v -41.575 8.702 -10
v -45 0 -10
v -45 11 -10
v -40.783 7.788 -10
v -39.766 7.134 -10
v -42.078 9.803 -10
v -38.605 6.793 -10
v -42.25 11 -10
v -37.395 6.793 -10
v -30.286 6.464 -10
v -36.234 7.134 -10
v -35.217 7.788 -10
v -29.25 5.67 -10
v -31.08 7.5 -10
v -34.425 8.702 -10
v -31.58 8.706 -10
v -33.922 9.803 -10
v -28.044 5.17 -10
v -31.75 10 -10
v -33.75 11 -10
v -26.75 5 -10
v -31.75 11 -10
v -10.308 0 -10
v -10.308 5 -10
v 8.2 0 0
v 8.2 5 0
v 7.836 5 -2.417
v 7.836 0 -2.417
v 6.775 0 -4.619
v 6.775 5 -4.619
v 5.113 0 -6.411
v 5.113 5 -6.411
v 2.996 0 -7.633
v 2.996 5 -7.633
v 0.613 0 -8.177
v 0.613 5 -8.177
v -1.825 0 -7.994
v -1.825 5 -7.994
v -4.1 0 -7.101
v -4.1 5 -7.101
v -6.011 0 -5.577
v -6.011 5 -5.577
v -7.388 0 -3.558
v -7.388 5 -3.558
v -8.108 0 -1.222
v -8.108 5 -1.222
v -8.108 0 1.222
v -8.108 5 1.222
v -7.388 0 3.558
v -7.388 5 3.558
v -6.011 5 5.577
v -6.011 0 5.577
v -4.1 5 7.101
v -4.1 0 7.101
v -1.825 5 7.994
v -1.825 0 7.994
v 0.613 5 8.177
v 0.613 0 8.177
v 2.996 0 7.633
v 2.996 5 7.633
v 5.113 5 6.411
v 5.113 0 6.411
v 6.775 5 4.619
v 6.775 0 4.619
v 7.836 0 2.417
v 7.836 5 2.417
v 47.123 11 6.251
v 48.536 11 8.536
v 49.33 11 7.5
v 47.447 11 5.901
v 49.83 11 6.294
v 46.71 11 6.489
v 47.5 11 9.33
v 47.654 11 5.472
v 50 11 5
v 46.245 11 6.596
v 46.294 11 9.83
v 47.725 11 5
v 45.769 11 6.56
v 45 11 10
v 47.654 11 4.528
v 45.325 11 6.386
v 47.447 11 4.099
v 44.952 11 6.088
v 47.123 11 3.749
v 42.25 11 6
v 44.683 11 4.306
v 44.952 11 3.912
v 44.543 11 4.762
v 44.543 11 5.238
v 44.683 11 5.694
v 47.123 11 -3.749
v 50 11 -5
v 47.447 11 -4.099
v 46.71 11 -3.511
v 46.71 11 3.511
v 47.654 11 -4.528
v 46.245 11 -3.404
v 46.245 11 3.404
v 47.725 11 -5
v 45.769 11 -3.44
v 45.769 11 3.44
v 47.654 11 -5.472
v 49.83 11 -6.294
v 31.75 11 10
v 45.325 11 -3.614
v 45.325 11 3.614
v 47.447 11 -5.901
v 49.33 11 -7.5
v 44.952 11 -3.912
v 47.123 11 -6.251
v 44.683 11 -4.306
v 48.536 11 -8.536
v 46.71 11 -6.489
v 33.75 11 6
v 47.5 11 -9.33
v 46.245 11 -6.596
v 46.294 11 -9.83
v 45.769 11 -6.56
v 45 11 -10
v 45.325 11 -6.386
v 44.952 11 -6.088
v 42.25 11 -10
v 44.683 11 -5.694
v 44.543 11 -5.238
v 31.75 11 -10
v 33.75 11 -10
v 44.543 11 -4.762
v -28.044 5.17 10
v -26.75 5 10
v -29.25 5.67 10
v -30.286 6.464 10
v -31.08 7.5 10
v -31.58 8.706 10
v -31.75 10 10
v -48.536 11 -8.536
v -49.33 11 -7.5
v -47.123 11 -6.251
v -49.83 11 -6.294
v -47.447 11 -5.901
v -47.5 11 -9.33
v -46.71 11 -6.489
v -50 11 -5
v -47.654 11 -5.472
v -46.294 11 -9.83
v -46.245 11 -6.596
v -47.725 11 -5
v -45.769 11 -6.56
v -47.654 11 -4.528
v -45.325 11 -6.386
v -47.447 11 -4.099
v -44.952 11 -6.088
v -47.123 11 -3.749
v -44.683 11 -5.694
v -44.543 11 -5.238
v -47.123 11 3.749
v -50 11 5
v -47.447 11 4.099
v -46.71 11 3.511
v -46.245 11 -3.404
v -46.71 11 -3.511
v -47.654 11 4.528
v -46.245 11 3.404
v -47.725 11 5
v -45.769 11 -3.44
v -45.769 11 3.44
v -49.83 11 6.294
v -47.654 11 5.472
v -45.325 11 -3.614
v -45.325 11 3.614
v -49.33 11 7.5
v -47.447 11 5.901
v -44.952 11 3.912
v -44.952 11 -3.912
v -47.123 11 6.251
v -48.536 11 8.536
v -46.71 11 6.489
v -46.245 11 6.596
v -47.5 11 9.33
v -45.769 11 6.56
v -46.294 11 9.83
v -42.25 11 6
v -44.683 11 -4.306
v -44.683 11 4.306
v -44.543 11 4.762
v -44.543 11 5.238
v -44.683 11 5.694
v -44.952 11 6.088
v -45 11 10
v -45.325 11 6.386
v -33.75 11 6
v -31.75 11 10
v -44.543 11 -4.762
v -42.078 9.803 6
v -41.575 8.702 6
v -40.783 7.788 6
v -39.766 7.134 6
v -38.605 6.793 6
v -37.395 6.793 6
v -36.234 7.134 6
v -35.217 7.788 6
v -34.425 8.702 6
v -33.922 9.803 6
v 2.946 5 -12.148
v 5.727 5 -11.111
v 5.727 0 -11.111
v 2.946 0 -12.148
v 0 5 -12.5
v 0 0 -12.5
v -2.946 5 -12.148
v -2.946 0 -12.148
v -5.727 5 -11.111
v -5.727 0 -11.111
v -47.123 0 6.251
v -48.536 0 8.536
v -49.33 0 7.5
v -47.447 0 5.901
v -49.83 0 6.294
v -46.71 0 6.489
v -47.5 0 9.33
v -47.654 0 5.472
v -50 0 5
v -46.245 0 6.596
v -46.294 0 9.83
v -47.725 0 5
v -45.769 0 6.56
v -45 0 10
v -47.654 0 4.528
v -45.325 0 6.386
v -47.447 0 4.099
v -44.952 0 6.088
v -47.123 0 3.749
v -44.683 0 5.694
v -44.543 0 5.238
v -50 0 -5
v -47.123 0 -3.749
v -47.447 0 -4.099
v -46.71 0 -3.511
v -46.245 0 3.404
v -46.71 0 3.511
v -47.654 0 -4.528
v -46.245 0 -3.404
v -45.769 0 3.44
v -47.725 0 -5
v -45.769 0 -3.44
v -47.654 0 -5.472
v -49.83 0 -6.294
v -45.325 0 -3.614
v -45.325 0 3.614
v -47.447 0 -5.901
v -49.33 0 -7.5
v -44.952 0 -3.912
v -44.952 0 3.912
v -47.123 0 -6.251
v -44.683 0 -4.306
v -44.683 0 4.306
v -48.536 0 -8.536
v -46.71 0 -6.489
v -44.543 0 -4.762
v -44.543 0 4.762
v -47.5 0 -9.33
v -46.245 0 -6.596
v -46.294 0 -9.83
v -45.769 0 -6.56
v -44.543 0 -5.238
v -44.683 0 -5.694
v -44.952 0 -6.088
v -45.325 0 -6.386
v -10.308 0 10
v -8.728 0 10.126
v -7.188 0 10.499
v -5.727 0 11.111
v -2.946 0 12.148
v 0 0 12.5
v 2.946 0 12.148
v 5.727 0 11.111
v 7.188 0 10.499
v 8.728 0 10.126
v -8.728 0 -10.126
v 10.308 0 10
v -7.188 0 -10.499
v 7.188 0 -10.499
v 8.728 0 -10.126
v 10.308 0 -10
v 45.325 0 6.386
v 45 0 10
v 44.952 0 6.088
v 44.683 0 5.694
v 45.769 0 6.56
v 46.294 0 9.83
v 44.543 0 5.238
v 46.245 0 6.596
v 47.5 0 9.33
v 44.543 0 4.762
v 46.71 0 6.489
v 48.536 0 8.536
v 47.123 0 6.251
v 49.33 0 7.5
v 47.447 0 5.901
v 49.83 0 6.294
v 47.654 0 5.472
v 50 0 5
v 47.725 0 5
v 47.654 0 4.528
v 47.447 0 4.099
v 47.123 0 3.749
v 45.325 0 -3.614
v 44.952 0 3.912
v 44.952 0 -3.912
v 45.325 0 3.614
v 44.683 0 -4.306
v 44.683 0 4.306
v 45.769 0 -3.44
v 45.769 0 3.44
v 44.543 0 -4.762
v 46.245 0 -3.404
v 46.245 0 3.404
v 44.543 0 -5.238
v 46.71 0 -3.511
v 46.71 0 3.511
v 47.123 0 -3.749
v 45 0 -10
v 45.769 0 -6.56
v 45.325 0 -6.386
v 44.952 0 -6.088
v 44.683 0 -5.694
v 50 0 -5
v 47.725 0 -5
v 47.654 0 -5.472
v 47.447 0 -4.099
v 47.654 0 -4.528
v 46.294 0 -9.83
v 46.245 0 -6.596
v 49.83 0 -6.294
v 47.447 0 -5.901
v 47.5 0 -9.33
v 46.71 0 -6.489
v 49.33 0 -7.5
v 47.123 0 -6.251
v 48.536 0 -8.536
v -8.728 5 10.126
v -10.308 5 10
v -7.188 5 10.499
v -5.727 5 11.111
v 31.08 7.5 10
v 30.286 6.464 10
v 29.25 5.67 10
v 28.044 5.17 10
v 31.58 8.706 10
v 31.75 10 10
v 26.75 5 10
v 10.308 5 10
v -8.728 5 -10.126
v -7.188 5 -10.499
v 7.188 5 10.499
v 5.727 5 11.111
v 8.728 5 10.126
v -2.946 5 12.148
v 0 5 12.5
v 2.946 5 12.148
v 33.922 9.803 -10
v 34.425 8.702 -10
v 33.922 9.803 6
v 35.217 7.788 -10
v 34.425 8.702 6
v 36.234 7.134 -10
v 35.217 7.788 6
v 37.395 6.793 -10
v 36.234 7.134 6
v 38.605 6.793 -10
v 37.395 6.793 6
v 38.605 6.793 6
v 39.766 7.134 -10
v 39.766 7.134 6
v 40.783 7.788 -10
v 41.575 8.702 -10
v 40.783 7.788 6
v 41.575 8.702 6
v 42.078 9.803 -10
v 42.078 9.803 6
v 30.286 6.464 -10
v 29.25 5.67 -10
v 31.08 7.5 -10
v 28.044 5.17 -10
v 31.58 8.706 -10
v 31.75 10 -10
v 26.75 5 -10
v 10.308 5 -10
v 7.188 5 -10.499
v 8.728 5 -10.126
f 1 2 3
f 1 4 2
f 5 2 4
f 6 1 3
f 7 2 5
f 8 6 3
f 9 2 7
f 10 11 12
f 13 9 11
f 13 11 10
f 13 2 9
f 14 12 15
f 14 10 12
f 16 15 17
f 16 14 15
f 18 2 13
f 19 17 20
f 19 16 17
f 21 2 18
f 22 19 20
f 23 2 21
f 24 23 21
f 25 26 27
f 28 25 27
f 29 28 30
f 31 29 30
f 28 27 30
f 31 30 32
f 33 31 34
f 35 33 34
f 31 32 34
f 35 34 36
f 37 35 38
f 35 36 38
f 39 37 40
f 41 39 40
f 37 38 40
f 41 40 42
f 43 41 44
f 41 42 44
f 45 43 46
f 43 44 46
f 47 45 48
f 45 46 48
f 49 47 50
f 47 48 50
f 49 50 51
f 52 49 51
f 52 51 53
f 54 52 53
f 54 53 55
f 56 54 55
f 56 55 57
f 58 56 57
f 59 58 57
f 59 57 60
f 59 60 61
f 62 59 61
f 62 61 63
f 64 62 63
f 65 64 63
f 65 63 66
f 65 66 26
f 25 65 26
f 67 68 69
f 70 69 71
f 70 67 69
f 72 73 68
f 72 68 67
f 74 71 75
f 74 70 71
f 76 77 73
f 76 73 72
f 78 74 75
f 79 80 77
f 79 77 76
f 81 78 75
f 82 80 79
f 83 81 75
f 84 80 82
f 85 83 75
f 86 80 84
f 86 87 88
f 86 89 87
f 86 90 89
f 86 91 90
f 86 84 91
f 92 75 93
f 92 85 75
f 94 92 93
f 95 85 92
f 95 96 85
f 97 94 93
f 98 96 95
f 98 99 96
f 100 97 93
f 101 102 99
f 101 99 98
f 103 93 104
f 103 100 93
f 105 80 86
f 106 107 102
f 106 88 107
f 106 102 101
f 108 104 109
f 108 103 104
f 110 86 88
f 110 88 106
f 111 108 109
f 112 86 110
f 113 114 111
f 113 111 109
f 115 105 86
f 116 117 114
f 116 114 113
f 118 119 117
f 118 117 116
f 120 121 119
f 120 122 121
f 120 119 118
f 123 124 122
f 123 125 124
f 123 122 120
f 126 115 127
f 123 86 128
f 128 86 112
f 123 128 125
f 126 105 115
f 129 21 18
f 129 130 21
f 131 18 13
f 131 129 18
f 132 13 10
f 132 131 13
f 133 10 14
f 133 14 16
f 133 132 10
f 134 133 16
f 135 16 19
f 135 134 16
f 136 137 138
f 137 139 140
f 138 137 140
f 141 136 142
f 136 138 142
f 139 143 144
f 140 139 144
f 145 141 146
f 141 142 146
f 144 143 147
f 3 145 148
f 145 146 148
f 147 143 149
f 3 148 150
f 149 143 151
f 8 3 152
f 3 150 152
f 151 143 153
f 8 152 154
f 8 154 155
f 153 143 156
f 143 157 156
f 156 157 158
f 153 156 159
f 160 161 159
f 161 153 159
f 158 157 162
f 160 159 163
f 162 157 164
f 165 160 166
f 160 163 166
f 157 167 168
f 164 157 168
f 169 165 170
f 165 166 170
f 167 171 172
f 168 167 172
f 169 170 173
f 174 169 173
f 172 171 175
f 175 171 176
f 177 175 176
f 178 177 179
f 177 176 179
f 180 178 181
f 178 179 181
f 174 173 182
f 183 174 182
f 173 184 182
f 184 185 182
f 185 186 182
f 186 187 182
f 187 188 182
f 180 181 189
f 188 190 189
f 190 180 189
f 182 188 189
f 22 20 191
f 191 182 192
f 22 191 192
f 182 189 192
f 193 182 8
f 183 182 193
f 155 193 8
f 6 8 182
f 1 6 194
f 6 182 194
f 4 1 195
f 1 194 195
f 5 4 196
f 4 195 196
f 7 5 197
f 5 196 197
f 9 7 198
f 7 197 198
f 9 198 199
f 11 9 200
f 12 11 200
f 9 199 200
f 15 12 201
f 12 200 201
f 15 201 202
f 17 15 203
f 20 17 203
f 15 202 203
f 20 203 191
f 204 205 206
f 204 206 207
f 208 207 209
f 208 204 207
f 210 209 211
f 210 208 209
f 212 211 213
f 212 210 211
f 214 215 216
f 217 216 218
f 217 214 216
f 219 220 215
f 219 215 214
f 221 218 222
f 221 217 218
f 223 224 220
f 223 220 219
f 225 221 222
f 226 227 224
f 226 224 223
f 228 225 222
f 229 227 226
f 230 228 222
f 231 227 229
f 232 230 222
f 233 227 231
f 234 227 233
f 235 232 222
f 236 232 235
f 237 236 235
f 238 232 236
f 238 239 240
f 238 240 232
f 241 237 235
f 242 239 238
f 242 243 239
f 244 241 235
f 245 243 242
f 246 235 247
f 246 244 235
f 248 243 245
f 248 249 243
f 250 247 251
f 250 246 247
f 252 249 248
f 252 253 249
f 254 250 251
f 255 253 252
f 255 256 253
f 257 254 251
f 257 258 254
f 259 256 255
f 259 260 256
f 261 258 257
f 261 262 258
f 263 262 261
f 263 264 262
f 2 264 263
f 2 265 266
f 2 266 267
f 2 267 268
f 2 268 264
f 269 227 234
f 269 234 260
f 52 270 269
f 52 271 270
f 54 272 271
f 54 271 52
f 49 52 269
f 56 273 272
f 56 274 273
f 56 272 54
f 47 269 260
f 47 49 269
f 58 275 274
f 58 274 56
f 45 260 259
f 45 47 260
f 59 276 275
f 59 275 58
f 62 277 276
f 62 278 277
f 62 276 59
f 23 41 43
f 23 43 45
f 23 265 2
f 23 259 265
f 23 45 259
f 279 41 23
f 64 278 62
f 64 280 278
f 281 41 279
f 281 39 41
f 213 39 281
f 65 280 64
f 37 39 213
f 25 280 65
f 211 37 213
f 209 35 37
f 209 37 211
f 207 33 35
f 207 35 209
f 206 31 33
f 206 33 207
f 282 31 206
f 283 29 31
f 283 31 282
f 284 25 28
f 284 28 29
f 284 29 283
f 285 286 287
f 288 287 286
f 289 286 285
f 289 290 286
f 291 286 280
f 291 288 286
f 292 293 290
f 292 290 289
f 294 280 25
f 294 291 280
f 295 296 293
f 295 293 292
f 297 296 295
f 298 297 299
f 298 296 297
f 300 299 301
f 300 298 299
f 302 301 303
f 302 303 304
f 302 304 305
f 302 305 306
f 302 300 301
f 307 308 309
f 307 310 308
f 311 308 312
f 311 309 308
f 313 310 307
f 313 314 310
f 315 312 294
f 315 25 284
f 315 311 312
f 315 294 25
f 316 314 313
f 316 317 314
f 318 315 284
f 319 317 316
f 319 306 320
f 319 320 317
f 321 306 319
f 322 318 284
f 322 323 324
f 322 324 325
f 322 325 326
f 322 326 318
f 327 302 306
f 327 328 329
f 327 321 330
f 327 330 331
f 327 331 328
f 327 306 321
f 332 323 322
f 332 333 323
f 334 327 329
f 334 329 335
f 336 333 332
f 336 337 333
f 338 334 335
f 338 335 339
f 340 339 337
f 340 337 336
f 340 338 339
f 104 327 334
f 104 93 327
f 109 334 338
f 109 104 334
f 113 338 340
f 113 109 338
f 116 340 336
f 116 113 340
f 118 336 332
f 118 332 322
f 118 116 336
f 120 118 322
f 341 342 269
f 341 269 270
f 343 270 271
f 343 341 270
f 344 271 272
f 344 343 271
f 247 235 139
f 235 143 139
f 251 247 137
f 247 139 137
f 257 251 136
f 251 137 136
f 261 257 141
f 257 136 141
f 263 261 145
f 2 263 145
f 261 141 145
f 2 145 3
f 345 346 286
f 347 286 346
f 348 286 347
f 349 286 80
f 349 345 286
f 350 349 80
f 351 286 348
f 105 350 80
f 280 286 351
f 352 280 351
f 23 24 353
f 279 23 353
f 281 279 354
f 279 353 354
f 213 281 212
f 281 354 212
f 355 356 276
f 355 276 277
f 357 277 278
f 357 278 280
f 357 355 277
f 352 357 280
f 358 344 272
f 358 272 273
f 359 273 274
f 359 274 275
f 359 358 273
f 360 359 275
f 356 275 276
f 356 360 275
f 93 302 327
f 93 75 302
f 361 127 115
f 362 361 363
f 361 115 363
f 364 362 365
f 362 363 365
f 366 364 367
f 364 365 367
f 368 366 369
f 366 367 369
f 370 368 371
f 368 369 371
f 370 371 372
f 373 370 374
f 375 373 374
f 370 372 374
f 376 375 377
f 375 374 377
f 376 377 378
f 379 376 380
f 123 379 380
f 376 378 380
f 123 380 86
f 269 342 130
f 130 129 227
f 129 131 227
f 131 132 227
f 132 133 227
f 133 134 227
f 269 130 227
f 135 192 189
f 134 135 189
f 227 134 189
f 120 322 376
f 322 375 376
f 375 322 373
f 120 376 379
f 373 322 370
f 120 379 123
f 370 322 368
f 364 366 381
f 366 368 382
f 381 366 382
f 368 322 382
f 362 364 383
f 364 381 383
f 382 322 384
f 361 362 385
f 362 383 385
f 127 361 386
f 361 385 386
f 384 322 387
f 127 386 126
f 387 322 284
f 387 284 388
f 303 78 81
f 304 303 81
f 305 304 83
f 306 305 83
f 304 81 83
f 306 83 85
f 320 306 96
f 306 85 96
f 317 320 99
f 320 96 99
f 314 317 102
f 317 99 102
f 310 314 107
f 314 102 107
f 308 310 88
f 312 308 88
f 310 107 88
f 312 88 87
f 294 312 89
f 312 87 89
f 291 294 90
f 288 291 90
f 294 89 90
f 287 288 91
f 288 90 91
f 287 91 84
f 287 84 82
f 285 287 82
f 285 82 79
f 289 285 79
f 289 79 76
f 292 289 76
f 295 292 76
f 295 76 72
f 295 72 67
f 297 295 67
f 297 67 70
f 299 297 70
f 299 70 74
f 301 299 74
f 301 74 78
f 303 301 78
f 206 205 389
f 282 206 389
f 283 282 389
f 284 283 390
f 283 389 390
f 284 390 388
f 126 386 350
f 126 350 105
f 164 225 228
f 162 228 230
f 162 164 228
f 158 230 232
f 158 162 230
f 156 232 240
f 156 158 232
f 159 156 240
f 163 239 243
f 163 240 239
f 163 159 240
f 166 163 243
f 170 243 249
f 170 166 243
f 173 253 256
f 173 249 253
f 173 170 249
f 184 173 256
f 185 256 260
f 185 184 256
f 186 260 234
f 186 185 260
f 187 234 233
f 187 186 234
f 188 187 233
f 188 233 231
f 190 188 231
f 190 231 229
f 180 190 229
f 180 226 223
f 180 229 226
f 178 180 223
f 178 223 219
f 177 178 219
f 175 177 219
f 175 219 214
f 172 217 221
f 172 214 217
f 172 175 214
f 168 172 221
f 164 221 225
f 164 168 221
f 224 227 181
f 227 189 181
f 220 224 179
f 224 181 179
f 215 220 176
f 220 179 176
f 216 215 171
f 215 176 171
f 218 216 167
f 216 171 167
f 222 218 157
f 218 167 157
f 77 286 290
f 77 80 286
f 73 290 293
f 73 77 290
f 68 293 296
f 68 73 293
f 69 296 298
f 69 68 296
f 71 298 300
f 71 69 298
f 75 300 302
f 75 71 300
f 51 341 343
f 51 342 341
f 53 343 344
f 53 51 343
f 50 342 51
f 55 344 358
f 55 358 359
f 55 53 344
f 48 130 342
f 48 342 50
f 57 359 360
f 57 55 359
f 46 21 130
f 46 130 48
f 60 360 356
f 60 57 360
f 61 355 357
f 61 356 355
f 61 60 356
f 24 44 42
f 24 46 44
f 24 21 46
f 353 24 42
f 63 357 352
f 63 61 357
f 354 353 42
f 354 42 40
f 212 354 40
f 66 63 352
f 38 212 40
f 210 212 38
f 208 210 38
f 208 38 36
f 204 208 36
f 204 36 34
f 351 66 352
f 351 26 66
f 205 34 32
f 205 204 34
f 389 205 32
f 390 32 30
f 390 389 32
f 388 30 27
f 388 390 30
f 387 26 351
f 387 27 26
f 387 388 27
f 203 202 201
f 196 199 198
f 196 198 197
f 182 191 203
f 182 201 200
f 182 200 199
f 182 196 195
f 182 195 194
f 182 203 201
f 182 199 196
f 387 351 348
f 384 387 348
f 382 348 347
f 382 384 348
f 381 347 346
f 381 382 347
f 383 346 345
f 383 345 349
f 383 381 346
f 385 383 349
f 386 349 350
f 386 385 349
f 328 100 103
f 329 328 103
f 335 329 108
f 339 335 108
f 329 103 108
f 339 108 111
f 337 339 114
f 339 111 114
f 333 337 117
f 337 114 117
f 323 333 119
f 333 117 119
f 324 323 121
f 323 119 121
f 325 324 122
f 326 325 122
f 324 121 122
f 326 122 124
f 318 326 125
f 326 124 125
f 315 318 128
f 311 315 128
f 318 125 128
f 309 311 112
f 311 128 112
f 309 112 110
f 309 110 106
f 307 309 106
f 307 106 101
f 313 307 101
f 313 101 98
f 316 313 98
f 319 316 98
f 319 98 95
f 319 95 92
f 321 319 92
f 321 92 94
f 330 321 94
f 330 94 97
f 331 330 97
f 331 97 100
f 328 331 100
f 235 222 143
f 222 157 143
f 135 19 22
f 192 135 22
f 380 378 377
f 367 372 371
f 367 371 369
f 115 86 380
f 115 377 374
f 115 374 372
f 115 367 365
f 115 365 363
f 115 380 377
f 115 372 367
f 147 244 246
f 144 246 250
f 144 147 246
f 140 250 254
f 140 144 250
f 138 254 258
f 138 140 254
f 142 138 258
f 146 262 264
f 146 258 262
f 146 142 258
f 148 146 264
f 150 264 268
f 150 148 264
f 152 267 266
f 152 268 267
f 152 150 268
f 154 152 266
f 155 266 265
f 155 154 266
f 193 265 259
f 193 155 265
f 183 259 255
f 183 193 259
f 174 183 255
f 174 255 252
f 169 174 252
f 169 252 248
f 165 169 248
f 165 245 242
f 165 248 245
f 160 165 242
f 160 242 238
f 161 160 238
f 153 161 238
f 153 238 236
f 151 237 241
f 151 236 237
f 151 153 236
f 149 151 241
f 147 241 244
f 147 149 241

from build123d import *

# Parameters (mm, degrees)
SKETCH1_W               = 88
SKETCH1_H               = 20
BOSS_EXTRUDE1_DEPTH     = 22
SKETCH2_R               = 4.25
CUT_EXTRUDE1_DEPTH      = 21
SKETCH7_R               = 12.5
BOSS_EXTRUDE2_DEPTH     = 22
SKETCH4_R               = 8.2
CUT_EXTRUDE3_DEPTH      = 23
FILLET2_R               = 10
SKETCH9_W               = 27
SKETCH9_H               = 11
CUT_EXTRUDE4_DEPTH      = 89
SKETCH10_W              = 63.5
SKETCH10_H              = 8
CUT_EXTRUDE5_DEPTH      = 13.5
CUT_EXTRUDE5_DEPTH_BACK = 13.5
FILLET3_R               = 5
SKETCH11_W              = 20
SKETCH11_H              = 11
BOSS_EXTRUDE3_DEPTH     = 6
SKETCH12_R              = 1.6
CUT_EXTRUDE6_DEPTH      = 12
FILLET4_R               = 5
BOSS_EXTRUDE4_DEPTH     = 4


with BuildPart() as part:
    # Sketch1 → Boss-Extrude1 (new body)
    with BuildSketch(Plane(origin=(0, 0, 0), x_dir=(1, 0, 0), z_dir=(0, 1, 0))):
        Rectangle(SKETCH1_W, SKETCH1_H)
    extrude(amount=BOSS_EXTRUDE1_DEPTH)

    # Sketch2 → Cut-Extrude1 (cut, through all)
    with BuildSketch(Plane.XY.offset(10)):
        with Locations((-38, 11)):
            Circle(SKETCH2_R)
        with Locations((38, 11)):
            Circle(SKETCH2_R)
    extrude(amount=-CUT_EXTRUDE1_DEPTH, mode=Mode.SUBTRACT)

    # Sketch7 → Boss-Extrude2 (add)
    with BuildSketch(Plane(origin=(0, 22, 0), x_dir=(1, 0, 0), z_dir=(0, 1, 0))):
        Circle(SKETCH7_R)
    extrude(amount=-BOSS_EXTRUDE2_DEPTH)

    # Sketch4 → Cut-Extrude3 (cut, through all)
    with BuildSketch(Plane(origin=(0, 22, 0), x_dir=(1, 0, 0), z_dir=(0, 1, 0))):
        Circle(SKETCH4_R)
    extrude(amount=-CUT_EXTRUDE3_DEPTH, mode=Mode.SUBTRACT)

    # Fillet2
    fillet2_edges = [part.edges().sort_by_distance(p)[0] for p in [
        (7.5, 11, -10),
        (7.5, 11, 10),
        (-7.5, 11, -10),
        (-7.5, 11, 10),
    ]]
    fillet(fillet2_edges, radius=FILLET2_R)

    # Sketch9 → Cut-Extrude4 (cut, through all)
    with BuildSketch(Plane.ZY.offset(44)):
        with Locations((0, 16.5)):
            Rectangle(SKETCH9_W, SKETCH9_H)
    extrude(amount=-CUT_EXTRUDE4_DEPTH, mode=Mode.SUBTRACT)

    # Sketch10 → Cut-Extrude5 (cut, two sides)
    with BuildSketch(Plane.XY) as cut_extrude5_sk:
        with Locations((0, 9)):
            Rectangle(SKETCH10_W, SKETCH10_H)
    extrude(amount=CUT_EXTRUDE5_DEPTH, mode=Mode.SUBTRACT)
    extrude(cut_extrude5_sk.sketch, amount=-CUT_EXTRUDE5_DEPTH_BACK, mode=Mode.SUBTRACT)

    # Fillet3
    fillet3_edges = [part.edges().sort_by_distance(p)[0] for p in [
        (31.75, 5, 0),
        (-31.75, 5, 0),
    ]]
    fillet(fillet3_edges, radius=FILLET3_R)

    # Sketch11 → Boss-Extrude3 (add)
    with BuildSketch(Plane(origin=(44, 0, 0), x_dir=(0, 0, -1), z_dir=(1, 0, 0))):
        with Locations((0, 5.5)):
            Rectangle(SKETCH11_W, SKETCH11_H)
    boss_extrude3 = extrude(amount=BOSS_EXTRUDE3_DEPTH)

    # Sketch12 → Cut-Extrude6 (cut, through all)
    with BuildSketch(Plane(origin=(0, 11, 0), x_dir=(1, 0, 0), z_dir=(0, 1, 0))):
        with Locations((46.125, -5)):
            Circle(SKETCH12_R)
        with Locations((46.125, 5)):
            Circle(SKETCH12_R)
    cut_extrude6 = extrude(amount=-CUT_EXTRUDE6_DEPTH, mode=Mode.SUBTRACT)

    # Mirror1: Boss-Extrude3, Cut-Extrude6 across plane
    add(boss_extrude3.mirror(Plane(origin=(0, 0, 0), x_dir=(0, 0, 1), z_dir=(1, 0, 0))))
    add(cut_extrude6.mirror(Plane(origin=(0, 0, 0), x_dir=(0, 0, 1), z_dir=(1, 0, 0))), mode=Mode.SUBTRACT)

    # Fillet4
    fillet4_edges = [part.edges().sort_by_distance(p)[0] for p in [
        (50, 5.5, -10),
        (50, 5.5, 10),
        (-50, 5.5, 10),
        (-50, 5.5, -10),
    ]]
    fillet(fillet4_edges, radius=FILLET4_R)

    # Sketch13 → Boss-Extrude4 (add)
    with BuildSketch(Plane.XY.offset(10)):
        with BuildLine():
            Line((-42.25, 11), (-33.75, 11))
            ThreePointArc((-33.75, 11), (-38, 6.75), (-42.25, 11))
        make_face()
        with BuildLine():
            Line((33.75, 11), (42.25, 11))
            ThreePointArc((42.25, 11), (38, 6.75), (33.75, 11))
        make_face()
    extrude(amount=-BOSS_EXTRUDE4_DEPTH)


solid = part.part
